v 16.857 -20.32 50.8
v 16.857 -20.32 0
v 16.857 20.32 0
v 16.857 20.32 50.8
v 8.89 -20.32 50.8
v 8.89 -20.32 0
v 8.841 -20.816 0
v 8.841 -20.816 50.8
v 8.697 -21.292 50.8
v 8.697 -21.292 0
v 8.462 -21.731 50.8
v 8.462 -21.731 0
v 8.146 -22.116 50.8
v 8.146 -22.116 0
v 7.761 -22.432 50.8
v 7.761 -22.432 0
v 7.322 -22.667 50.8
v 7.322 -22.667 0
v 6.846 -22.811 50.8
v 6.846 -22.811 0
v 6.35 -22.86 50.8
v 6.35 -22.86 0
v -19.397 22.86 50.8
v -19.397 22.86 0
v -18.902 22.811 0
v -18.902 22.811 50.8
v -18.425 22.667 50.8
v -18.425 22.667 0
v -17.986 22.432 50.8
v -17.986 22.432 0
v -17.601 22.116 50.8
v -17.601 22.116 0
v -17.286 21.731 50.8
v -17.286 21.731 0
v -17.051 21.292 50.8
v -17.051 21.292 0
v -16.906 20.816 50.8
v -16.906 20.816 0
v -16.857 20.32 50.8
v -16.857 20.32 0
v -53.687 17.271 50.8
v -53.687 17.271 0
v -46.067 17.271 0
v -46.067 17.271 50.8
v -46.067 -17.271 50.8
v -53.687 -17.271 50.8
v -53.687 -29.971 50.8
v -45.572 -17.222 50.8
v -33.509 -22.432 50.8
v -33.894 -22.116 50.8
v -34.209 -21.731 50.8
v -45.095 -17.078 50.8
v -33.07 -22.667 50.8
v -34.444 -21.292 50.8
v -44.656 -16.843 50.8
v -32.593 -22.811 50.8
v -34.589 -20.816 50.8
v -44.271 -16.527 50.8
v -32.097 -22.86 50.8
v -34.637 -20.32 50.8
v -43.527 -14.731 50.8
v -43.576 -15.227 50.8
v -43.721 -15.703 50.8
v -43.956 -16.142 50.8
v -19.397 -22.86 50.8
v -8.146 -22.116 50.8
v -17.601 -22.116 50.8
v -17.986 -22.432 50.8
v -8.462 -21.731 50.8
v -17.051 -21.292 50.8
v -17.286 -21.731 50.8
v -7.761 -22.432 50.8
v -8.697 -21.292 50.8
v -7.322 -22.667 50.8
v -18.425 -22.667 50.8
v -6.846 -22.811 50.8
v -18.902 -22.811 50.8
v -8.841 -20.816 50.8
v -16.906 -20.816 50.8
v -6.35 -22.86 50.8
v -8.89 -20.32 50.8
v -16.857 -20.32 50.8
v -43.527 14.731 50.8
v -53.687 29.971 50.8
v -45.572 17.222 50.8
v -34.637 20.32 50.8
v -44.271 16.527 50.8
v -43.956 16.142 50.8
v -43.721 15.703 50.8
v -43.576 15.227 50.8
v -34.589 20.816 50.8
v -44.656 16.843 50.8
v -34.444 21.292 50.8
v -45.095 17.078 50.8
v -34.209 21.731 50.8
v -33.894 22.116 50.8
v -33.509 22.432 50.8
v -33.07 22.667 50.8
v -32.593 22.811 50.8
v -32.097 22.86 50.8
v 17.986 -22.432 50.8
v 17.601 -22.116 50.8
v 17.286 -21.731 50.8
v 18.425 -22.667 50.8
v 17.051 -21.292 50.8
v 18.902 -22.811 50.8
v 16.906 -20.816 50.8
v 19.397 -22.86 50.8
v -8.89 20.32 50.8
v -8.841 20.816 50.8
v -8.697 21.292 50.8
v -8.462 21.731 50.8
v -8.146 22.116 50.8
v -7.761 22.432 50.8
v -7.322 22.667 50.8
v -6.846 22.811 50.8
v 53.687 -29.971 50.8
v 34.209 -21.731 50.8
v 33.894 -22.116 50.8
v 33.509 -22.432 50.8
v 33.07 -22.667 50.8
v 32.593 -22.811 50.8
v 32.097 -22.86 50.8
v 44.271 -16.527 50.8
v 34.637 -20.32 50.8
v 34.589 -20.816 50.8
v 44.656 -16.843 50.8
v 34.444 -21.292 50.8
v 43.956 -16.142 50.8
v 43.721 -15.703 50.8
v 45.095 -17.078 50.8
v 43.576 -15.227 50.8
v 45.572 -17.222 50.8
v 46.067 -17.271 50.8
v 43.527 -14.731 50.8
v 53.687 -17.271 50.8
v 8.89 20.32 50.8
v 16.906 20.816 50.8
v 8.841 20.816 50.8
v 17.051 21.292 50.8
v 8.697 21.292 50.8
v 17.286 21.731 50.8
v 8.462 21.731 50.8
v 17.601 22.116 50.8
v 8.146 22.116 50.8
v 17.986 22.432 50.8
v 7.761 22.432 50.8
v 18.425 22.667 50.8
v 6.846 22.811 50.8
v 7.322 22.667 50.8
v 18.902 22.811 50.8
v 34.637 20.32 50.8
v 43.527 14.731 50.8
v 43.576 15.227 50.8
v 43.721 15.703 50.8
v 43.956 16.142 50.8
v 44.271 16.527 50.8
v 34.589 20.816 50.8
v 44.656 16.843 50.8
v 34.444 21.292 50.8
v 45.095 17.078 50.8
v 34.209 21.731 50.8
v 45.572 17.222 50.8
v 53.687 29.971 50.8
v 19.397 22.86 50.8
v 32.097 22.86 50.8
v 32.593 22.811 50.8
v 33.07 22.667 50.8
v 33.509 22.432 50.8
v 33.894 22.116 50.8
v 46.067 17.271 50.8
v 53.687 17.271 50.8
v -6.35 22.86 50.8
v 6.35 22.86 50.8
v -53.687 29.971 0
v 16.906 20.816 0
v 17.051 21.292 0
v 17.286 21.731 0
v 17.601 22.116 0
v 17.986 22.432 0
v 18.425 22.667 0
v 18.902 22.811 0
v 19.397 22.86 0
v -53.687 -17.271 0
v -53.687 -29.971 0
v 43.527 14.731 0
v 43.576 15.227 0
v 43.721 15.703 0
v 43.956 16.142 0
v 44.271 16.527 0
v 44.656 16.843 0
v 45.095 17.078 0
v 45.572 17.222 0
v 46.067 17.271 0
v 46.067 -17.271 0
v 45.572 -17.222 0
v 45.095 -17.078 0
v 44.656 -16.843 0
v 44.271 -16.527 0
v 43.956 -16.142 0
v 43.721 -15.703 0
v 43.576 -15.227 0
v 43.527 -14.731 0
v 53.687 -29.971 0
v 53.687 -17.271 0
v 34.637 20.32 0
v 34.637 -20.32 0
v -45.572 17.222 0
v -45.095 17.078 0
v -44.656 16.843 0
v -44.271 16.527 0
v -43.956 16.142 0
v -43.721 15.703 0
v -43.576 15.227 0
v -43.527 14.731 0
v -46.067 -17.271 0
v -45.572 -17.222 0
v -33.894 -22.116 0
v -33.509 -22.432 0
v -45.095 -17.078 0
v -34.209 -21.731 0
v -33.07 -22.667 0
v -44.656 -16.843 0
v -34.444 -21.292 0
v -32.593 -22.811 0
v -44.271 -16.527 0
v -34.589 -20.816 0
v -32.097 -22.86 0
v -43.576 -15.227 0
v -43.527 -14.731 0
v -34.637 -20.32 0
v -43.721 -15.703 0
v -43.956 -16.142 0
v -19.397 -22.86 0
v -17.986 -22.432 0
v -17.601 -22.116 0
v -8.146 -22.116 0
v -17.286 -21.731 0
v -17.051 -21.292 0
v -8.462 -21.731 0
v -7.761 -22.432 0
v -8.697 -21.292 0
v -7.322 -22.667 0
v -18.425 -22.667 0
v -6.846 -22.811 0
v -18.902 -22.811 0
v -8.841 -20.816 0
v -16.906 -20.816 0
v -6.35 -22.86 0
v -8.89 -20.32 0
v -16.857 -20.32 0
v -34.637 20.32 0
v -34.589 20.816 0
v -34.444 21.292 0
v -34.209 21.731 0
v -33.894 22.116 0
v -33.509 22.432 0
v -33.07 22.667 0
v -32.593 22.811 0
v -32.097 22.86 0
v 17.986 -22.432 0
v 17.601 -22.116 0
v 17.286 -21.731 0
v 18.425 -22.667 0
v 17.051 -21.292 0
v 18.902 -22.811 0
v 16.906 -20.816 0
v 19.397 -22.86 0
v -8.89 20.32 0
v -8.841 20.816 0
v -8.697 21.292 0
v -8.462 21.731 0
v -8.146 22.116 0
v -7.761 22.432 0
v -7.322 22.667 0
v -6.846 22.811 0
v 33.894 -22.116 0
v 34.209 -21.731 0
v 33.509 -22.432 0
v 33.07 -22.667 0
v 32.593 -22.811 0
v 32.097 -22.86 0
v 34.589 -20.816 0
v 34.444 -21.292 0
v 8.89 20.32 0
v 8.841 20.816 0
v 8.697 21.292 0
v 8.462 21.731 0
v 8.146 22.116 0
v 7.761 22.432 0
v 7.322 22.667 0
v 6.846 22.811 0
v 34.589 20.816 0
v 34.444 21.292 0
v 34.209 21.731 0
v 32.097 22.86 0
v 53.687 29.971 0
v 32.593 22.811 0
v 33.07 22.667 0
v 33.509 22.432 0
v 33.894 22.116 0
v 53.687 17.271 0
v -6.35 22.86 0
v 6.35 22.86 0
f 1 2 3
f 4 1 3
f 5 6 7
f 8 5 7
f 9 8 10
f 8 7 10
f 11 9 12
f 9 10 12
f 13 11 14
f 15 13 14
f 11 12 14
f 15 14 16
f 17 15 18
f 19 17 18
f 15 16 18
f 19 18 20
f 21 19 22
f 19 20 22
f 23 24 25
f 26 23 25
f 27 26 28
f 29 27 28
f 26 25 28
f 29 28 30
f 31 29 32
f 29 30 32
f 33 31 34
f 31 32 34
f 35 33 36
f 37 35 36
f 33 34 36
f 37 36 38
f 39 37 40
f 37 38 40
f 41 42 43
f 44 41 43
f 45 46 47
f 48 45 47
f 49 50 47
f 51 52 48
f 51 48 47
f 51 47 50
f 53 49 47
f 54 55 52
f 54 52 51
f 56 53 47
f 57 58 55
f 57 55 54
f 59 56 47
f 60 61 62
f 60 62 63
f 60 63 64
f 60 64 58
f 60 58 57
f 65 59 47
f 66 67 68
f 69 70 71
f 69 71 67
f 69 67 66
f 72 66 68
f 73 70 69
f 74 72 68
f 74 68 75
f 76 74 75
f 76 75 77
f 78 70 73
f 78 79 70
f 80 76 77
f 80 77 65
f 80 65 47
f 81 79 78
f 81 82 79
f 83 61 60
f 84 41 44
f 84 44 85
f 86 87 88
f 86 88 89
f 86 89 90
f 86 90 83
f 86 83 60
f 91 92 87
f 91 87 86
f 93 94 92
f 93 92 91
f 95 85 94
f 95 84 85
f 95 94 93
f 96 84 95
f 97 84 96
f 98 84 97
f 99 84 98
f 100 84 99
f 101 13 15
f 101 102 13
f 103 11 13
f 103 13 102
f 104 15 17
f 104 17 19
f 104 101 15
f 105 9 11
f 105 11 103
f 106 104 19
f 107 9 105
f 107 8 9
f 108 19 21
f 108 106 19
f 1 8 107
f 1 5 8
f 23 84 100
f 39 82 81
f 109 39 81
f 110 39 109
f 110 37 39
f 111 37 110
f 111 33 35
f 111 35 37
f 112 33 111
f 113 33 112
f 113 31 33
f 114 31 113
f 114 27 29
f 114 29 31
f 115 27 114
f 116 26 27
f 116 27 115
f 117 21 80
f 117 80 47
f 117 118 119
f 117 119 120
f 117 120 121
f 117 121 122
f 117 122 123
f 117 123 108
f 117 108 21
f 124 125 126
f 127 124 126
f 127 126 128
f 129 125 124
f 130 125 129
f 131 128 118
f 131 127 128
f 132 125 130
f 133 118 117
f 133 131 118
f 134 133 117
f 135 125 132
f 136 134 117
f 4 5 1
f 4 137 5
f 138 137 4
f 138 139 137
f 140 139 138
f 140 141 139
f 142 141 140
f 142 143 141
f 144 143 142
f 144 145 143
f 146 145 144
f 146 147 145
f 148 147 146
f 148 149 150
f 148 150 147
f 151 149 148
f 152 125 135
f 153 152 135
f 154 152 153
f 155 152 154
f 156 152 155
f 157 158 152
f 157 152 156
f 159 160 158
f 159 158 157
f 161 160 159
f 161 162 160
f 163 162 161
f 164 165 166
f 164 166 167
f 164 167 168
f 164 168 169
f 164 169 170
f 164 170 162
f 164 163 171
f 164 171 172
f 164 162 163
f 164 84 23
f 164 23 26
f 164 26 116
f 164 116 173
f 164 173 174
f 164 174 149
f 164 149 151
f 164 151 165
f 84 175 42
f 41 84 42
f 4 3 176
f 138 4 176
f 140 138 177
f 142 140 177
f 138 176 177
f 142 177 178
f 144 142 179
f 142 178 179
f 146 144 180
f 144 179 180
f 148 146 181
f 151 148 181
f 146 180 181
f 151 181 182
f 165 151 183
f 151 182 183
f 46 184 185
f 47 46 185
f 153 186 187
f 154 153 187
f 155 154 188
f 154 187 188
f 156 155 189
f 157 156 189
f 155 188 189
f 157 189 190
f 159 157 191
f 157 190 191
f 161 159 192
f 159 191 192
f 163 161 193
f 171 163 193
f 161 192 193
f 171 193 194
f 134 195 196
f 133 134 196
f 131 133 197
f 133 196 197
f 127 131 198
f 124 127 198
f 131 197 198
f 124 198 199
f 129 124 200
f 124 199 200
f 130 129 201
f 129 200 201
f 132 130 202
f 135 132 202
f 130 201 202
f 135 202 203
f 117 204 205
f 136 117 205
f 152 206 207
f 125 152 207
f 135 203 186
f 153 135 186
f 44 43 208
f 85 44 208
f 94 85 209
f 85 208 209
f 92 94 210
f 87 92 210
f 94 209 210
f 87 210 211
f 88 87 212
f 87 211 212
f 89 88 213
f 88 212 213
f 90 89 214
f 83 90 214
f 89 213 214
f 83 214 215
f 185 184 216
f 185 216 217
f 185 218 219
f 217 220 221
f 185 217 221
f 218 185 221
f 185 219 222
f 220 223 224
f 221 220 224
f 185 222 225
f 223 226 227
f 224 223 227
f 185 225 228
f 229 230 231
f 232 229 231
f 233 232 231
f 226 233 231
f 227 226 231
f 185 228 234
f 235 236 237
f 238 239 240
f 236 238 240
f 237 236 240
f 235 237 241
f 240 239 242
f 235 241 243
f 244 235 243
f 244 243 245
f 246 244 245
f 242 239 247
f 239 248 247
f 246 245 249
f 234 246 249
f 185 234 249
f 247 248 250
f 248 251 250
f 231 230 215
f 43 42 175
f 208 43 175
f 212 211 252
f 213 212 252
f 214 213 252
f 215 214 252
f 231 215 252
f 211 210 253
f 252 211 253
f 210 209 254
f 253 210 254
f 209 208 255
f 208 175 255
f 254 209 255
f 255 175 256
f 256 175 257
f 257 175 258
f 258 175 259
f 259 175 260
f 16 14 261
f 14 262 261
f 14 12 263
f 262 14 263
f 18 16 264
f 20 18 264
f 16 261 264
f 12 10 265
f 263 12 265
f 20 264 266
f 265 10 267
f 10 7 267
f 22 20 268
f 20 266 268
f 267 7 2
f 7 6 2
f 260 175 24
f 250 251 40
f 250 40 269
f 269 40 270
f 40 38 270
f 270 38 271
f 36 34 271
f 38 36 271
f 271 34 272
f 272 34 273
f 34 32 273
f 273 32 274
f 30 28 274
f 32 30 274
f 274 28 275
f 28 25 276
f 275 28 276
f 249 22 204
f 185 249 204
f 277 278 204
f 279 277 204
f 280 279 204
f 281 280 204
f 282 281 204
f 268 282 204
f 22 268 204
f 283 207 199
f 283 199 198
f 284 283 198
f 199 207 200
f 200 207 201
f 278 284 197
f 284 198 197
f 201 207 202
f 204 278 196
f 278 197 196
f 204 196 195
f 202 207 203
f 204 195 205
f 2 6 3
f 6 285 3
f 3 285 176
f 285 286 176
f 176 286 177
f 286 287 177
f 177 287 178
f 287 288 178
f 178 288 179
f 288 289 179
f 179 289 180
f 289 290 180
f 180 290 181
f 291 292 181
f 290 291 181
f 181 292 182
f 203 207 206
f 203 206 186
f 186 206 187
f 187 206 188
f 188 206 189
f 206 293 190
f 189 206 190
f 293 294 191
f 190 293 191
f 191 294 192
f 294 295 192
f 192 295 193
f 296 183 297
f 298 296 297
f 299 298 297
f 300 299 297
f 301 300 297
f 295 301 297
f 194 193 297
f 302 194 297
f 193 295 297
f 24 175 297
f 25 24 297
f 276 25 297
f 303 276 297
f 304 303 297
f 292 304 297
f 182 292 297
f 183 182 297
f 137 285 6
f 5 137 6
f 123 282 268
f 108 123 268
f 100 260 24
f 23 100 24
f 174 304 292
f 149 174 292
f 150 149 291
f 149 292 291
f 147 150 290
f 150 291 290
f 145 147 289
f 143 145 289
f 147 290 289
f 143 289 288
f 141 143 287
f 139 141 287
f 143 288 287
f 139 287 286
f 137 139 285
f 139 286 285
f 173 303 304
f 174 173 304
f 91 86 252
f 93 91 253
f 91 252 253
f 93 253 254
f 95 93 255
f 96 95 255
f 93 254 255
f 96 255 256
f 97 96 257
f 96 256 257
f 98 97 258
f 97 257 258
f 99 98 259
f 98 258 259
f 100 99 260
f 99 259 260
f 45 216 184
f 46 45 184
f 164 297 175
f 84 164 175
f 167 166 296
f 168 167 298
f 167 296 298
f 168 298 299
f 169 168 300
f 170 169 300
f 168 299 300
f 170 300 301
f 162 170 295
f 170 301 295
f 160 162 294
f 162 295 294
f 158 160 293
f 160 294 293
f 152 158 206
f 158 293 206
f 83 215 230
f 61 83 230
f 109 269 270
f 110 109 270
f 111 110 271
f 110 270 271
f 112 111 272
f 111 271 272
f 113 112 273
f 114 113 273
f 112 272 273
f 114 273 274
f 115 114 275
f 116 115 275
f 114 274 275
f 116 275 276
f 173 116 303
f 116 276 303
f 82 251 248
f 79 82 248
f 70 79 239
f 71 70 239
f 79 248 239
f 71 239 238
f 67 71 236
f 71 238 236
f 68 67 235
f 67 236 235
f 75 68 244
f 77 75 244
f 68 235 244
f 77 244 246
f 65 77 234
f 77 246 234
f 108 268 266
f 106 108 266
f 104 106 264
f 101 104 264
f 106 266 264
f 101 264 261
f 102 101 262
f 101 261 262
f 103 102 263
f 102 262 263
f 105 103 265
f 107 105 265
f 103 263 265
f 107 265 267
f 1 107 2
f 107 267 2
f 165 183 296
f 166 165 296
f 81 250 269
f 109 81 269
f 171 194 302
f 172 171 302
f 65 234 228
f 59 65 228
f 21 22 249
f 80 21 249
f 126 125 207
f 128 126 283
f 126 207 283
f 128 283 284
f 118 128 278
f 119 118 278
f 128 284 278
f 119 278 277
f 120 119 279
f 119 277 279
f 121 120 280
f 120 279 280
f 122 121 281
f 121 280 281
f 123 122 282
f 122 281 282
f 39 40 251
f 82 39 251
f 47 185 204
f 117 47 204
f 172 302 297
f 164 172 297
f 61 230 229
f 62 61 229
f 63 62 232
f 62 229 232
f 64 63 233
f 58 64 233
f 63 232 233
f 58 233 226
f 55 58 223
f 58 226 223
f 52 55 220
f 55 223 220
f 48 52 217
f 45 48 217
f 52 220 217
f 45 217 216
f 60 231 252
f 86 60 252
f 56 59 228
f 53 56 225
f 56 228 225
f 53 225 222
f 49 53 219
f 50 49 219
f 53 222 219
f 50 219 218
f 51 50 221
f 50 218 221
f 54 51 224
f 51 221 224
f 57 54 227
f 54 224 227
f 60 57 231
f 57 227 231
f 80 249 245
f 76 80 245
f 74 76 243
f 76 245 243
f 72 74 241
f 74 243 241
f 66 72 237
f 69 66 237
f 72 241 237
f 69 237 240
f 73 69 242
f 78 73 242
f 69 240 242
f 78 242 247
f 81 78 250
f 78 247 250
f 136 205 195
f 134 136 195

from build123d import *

# Parameters (mm, degrees)
F1_DEPTH = 50.8


with BuildPart() as f1:
    # F0 (on Top) → F1 (new body)
    with BuildSketch(Plane.XY):
        with BuildLine():
            Line((53.687494, 29.971173), (-53.687494, 29.971173))
            Line((-53.687494, 29.971173), (-53.687494, 17.271173))
            Line((-53.687494, 17.271173), (-46.067494, 17.271173))
            ThreePointArc((-46.067494, 17.271173), (-44.271443, 16.527224), (-43.527494, 14.731173))
            Line((-43.527494, 14.731173), (-43.527494, 0))
            Line((-43.527494, 0), (-34.637494, 0))
            Line((-34.637494, 0), (-34.637494, 20.32))
            ThreePointArc((-34.637494, 20.32), (-33.893545, 22.116051), (-32.097494, 22.86))
            Line((-32.097494, 22.86), (-19.397494, 22.86))
            ThreePointArc((-19.397494, 22.86), (-17.601443, 22.116051), (-16.857494, 20.32))
            Line((-16.857494, 20.32), (-16.857494, 0))
            Line((-16.857494, 0), (-8.89, 0))
            Line((-8.89, 0), (-8.89, 20.32))
            ThreePointArc((-8.89, 20.32), (-8.146051, 22.116051), (-6.35, 22.86))
            Line((-6.35, 22.86), (6.35, 22.86))
            ThreePointArc((6.35, 22.86), (8.146051, 22.116051), (8.89, 20.32))
            Line((8.89, 20.32), (8.89, 0))
            Line((8.89, 0), (16.857494, 0))
            Line((16.857494, 0), (16.857494, 20.32))
            ThreePointArc((16.857494, 20.32), (17.601443, 22.116051), (19.397494, 22.86))
            Line((19.397494, 22.86), (32.097494, 22.86))
            ThreePointArc((32.097494, 22.86), (33.893545, 22.116051), (34.637494, 20.32))
            Line((34.637494, 20.32), (34.637494, 0))
            Line((34.637494, 0), (43.527494, 0))
            Line((43.527494, 0), (43.527494, 14.731173))
            ThreePointArc((43.527494, 14.731173), (44.271443, 16.527224), (46.067494, 17.271173))
            Line((46.067494, 17.271173), (53.687494, 17.271173))
            Line((53.687494, 17.271173), (53.687494, 29.971173))
        make_face()
        with BuildLine():
            Line((-46.067494, -17.271173), (-53.687494, -17.271173))
            Line((-53.687494, -17.271173), (-53.687494, -29.971173))
            Line((-53.687494, -29.971173), (53.687494, -29.971173))
            Line((53.687494, -29.971173), (53.687494, -17.271173))
            Line((53.687494, -17.271173), (46.067494, -17.271173))
            ThreePointArc((46.067494, -17.271173), (44.271443, -16.527224), (43.527494, -14.731173))
            Line((43.527494, -14.731173), (43.527494, 0))
            Line((43.527494, 0), (34.637494, 0))
            Line((34.637494, 0), (34.637494, -20.32))
            ThreePointArc((34.637494, -20.32), (33.893545, -22.116051), (32.097494, -22.86))
            Line((32.097494, -22.86), (19.397494, -22.86))
            ThreePointArc((19.397494, -22.86), (17.601443, -22.116051), (16.857494, -20.32))
            Line((16.857494, -20.32), (16.857494, 0))
            Line((16.857494, 0), (8.89, 0))
            Line((8.89, 0), (8.89, -20.32))
            ThreePointArc((8.89, -20.32), (8.146051, -22.116051), (6.35, -22.86))
            Line((6.35, -22.86), (-6.35, -22.86))
            ThreePointArc((-6.35, -22.86), (-8.146051, -22.116051), (-8.89, -20.32))
            Line((-8.89, -20.32), (-8.89, 0))
            Line((-8.89, 0), (-16.857494, 0))
            Line((-16.857494, 0), (-16.857494, -20.32))
            ThreePointArc((-16.857494, -20.32), (-17.601443, -22.116051), (-19.397494, -22.86))
            Line((-19.397494, -22.86), (-32.097494, -22.86))
            ThreePointArc((-32.097494, -22.86), (-33.893545, -22.116051), (-34.637494, -20.32))
            Line((-34.637494, -20.32), (-34.637494, 0))
            Line((-34.637494, 0), (-43.527494, 0))
            Line((-43.527494, 0), (-43.527494, -14.731173))
            ThreePointArc((-43.527494, -14.731173), (-44.271443, -16.527224), (-46.067494, -17.271173))
        make_face()
    extrude(amount=F1_DEPTH)


solid = f1.part
